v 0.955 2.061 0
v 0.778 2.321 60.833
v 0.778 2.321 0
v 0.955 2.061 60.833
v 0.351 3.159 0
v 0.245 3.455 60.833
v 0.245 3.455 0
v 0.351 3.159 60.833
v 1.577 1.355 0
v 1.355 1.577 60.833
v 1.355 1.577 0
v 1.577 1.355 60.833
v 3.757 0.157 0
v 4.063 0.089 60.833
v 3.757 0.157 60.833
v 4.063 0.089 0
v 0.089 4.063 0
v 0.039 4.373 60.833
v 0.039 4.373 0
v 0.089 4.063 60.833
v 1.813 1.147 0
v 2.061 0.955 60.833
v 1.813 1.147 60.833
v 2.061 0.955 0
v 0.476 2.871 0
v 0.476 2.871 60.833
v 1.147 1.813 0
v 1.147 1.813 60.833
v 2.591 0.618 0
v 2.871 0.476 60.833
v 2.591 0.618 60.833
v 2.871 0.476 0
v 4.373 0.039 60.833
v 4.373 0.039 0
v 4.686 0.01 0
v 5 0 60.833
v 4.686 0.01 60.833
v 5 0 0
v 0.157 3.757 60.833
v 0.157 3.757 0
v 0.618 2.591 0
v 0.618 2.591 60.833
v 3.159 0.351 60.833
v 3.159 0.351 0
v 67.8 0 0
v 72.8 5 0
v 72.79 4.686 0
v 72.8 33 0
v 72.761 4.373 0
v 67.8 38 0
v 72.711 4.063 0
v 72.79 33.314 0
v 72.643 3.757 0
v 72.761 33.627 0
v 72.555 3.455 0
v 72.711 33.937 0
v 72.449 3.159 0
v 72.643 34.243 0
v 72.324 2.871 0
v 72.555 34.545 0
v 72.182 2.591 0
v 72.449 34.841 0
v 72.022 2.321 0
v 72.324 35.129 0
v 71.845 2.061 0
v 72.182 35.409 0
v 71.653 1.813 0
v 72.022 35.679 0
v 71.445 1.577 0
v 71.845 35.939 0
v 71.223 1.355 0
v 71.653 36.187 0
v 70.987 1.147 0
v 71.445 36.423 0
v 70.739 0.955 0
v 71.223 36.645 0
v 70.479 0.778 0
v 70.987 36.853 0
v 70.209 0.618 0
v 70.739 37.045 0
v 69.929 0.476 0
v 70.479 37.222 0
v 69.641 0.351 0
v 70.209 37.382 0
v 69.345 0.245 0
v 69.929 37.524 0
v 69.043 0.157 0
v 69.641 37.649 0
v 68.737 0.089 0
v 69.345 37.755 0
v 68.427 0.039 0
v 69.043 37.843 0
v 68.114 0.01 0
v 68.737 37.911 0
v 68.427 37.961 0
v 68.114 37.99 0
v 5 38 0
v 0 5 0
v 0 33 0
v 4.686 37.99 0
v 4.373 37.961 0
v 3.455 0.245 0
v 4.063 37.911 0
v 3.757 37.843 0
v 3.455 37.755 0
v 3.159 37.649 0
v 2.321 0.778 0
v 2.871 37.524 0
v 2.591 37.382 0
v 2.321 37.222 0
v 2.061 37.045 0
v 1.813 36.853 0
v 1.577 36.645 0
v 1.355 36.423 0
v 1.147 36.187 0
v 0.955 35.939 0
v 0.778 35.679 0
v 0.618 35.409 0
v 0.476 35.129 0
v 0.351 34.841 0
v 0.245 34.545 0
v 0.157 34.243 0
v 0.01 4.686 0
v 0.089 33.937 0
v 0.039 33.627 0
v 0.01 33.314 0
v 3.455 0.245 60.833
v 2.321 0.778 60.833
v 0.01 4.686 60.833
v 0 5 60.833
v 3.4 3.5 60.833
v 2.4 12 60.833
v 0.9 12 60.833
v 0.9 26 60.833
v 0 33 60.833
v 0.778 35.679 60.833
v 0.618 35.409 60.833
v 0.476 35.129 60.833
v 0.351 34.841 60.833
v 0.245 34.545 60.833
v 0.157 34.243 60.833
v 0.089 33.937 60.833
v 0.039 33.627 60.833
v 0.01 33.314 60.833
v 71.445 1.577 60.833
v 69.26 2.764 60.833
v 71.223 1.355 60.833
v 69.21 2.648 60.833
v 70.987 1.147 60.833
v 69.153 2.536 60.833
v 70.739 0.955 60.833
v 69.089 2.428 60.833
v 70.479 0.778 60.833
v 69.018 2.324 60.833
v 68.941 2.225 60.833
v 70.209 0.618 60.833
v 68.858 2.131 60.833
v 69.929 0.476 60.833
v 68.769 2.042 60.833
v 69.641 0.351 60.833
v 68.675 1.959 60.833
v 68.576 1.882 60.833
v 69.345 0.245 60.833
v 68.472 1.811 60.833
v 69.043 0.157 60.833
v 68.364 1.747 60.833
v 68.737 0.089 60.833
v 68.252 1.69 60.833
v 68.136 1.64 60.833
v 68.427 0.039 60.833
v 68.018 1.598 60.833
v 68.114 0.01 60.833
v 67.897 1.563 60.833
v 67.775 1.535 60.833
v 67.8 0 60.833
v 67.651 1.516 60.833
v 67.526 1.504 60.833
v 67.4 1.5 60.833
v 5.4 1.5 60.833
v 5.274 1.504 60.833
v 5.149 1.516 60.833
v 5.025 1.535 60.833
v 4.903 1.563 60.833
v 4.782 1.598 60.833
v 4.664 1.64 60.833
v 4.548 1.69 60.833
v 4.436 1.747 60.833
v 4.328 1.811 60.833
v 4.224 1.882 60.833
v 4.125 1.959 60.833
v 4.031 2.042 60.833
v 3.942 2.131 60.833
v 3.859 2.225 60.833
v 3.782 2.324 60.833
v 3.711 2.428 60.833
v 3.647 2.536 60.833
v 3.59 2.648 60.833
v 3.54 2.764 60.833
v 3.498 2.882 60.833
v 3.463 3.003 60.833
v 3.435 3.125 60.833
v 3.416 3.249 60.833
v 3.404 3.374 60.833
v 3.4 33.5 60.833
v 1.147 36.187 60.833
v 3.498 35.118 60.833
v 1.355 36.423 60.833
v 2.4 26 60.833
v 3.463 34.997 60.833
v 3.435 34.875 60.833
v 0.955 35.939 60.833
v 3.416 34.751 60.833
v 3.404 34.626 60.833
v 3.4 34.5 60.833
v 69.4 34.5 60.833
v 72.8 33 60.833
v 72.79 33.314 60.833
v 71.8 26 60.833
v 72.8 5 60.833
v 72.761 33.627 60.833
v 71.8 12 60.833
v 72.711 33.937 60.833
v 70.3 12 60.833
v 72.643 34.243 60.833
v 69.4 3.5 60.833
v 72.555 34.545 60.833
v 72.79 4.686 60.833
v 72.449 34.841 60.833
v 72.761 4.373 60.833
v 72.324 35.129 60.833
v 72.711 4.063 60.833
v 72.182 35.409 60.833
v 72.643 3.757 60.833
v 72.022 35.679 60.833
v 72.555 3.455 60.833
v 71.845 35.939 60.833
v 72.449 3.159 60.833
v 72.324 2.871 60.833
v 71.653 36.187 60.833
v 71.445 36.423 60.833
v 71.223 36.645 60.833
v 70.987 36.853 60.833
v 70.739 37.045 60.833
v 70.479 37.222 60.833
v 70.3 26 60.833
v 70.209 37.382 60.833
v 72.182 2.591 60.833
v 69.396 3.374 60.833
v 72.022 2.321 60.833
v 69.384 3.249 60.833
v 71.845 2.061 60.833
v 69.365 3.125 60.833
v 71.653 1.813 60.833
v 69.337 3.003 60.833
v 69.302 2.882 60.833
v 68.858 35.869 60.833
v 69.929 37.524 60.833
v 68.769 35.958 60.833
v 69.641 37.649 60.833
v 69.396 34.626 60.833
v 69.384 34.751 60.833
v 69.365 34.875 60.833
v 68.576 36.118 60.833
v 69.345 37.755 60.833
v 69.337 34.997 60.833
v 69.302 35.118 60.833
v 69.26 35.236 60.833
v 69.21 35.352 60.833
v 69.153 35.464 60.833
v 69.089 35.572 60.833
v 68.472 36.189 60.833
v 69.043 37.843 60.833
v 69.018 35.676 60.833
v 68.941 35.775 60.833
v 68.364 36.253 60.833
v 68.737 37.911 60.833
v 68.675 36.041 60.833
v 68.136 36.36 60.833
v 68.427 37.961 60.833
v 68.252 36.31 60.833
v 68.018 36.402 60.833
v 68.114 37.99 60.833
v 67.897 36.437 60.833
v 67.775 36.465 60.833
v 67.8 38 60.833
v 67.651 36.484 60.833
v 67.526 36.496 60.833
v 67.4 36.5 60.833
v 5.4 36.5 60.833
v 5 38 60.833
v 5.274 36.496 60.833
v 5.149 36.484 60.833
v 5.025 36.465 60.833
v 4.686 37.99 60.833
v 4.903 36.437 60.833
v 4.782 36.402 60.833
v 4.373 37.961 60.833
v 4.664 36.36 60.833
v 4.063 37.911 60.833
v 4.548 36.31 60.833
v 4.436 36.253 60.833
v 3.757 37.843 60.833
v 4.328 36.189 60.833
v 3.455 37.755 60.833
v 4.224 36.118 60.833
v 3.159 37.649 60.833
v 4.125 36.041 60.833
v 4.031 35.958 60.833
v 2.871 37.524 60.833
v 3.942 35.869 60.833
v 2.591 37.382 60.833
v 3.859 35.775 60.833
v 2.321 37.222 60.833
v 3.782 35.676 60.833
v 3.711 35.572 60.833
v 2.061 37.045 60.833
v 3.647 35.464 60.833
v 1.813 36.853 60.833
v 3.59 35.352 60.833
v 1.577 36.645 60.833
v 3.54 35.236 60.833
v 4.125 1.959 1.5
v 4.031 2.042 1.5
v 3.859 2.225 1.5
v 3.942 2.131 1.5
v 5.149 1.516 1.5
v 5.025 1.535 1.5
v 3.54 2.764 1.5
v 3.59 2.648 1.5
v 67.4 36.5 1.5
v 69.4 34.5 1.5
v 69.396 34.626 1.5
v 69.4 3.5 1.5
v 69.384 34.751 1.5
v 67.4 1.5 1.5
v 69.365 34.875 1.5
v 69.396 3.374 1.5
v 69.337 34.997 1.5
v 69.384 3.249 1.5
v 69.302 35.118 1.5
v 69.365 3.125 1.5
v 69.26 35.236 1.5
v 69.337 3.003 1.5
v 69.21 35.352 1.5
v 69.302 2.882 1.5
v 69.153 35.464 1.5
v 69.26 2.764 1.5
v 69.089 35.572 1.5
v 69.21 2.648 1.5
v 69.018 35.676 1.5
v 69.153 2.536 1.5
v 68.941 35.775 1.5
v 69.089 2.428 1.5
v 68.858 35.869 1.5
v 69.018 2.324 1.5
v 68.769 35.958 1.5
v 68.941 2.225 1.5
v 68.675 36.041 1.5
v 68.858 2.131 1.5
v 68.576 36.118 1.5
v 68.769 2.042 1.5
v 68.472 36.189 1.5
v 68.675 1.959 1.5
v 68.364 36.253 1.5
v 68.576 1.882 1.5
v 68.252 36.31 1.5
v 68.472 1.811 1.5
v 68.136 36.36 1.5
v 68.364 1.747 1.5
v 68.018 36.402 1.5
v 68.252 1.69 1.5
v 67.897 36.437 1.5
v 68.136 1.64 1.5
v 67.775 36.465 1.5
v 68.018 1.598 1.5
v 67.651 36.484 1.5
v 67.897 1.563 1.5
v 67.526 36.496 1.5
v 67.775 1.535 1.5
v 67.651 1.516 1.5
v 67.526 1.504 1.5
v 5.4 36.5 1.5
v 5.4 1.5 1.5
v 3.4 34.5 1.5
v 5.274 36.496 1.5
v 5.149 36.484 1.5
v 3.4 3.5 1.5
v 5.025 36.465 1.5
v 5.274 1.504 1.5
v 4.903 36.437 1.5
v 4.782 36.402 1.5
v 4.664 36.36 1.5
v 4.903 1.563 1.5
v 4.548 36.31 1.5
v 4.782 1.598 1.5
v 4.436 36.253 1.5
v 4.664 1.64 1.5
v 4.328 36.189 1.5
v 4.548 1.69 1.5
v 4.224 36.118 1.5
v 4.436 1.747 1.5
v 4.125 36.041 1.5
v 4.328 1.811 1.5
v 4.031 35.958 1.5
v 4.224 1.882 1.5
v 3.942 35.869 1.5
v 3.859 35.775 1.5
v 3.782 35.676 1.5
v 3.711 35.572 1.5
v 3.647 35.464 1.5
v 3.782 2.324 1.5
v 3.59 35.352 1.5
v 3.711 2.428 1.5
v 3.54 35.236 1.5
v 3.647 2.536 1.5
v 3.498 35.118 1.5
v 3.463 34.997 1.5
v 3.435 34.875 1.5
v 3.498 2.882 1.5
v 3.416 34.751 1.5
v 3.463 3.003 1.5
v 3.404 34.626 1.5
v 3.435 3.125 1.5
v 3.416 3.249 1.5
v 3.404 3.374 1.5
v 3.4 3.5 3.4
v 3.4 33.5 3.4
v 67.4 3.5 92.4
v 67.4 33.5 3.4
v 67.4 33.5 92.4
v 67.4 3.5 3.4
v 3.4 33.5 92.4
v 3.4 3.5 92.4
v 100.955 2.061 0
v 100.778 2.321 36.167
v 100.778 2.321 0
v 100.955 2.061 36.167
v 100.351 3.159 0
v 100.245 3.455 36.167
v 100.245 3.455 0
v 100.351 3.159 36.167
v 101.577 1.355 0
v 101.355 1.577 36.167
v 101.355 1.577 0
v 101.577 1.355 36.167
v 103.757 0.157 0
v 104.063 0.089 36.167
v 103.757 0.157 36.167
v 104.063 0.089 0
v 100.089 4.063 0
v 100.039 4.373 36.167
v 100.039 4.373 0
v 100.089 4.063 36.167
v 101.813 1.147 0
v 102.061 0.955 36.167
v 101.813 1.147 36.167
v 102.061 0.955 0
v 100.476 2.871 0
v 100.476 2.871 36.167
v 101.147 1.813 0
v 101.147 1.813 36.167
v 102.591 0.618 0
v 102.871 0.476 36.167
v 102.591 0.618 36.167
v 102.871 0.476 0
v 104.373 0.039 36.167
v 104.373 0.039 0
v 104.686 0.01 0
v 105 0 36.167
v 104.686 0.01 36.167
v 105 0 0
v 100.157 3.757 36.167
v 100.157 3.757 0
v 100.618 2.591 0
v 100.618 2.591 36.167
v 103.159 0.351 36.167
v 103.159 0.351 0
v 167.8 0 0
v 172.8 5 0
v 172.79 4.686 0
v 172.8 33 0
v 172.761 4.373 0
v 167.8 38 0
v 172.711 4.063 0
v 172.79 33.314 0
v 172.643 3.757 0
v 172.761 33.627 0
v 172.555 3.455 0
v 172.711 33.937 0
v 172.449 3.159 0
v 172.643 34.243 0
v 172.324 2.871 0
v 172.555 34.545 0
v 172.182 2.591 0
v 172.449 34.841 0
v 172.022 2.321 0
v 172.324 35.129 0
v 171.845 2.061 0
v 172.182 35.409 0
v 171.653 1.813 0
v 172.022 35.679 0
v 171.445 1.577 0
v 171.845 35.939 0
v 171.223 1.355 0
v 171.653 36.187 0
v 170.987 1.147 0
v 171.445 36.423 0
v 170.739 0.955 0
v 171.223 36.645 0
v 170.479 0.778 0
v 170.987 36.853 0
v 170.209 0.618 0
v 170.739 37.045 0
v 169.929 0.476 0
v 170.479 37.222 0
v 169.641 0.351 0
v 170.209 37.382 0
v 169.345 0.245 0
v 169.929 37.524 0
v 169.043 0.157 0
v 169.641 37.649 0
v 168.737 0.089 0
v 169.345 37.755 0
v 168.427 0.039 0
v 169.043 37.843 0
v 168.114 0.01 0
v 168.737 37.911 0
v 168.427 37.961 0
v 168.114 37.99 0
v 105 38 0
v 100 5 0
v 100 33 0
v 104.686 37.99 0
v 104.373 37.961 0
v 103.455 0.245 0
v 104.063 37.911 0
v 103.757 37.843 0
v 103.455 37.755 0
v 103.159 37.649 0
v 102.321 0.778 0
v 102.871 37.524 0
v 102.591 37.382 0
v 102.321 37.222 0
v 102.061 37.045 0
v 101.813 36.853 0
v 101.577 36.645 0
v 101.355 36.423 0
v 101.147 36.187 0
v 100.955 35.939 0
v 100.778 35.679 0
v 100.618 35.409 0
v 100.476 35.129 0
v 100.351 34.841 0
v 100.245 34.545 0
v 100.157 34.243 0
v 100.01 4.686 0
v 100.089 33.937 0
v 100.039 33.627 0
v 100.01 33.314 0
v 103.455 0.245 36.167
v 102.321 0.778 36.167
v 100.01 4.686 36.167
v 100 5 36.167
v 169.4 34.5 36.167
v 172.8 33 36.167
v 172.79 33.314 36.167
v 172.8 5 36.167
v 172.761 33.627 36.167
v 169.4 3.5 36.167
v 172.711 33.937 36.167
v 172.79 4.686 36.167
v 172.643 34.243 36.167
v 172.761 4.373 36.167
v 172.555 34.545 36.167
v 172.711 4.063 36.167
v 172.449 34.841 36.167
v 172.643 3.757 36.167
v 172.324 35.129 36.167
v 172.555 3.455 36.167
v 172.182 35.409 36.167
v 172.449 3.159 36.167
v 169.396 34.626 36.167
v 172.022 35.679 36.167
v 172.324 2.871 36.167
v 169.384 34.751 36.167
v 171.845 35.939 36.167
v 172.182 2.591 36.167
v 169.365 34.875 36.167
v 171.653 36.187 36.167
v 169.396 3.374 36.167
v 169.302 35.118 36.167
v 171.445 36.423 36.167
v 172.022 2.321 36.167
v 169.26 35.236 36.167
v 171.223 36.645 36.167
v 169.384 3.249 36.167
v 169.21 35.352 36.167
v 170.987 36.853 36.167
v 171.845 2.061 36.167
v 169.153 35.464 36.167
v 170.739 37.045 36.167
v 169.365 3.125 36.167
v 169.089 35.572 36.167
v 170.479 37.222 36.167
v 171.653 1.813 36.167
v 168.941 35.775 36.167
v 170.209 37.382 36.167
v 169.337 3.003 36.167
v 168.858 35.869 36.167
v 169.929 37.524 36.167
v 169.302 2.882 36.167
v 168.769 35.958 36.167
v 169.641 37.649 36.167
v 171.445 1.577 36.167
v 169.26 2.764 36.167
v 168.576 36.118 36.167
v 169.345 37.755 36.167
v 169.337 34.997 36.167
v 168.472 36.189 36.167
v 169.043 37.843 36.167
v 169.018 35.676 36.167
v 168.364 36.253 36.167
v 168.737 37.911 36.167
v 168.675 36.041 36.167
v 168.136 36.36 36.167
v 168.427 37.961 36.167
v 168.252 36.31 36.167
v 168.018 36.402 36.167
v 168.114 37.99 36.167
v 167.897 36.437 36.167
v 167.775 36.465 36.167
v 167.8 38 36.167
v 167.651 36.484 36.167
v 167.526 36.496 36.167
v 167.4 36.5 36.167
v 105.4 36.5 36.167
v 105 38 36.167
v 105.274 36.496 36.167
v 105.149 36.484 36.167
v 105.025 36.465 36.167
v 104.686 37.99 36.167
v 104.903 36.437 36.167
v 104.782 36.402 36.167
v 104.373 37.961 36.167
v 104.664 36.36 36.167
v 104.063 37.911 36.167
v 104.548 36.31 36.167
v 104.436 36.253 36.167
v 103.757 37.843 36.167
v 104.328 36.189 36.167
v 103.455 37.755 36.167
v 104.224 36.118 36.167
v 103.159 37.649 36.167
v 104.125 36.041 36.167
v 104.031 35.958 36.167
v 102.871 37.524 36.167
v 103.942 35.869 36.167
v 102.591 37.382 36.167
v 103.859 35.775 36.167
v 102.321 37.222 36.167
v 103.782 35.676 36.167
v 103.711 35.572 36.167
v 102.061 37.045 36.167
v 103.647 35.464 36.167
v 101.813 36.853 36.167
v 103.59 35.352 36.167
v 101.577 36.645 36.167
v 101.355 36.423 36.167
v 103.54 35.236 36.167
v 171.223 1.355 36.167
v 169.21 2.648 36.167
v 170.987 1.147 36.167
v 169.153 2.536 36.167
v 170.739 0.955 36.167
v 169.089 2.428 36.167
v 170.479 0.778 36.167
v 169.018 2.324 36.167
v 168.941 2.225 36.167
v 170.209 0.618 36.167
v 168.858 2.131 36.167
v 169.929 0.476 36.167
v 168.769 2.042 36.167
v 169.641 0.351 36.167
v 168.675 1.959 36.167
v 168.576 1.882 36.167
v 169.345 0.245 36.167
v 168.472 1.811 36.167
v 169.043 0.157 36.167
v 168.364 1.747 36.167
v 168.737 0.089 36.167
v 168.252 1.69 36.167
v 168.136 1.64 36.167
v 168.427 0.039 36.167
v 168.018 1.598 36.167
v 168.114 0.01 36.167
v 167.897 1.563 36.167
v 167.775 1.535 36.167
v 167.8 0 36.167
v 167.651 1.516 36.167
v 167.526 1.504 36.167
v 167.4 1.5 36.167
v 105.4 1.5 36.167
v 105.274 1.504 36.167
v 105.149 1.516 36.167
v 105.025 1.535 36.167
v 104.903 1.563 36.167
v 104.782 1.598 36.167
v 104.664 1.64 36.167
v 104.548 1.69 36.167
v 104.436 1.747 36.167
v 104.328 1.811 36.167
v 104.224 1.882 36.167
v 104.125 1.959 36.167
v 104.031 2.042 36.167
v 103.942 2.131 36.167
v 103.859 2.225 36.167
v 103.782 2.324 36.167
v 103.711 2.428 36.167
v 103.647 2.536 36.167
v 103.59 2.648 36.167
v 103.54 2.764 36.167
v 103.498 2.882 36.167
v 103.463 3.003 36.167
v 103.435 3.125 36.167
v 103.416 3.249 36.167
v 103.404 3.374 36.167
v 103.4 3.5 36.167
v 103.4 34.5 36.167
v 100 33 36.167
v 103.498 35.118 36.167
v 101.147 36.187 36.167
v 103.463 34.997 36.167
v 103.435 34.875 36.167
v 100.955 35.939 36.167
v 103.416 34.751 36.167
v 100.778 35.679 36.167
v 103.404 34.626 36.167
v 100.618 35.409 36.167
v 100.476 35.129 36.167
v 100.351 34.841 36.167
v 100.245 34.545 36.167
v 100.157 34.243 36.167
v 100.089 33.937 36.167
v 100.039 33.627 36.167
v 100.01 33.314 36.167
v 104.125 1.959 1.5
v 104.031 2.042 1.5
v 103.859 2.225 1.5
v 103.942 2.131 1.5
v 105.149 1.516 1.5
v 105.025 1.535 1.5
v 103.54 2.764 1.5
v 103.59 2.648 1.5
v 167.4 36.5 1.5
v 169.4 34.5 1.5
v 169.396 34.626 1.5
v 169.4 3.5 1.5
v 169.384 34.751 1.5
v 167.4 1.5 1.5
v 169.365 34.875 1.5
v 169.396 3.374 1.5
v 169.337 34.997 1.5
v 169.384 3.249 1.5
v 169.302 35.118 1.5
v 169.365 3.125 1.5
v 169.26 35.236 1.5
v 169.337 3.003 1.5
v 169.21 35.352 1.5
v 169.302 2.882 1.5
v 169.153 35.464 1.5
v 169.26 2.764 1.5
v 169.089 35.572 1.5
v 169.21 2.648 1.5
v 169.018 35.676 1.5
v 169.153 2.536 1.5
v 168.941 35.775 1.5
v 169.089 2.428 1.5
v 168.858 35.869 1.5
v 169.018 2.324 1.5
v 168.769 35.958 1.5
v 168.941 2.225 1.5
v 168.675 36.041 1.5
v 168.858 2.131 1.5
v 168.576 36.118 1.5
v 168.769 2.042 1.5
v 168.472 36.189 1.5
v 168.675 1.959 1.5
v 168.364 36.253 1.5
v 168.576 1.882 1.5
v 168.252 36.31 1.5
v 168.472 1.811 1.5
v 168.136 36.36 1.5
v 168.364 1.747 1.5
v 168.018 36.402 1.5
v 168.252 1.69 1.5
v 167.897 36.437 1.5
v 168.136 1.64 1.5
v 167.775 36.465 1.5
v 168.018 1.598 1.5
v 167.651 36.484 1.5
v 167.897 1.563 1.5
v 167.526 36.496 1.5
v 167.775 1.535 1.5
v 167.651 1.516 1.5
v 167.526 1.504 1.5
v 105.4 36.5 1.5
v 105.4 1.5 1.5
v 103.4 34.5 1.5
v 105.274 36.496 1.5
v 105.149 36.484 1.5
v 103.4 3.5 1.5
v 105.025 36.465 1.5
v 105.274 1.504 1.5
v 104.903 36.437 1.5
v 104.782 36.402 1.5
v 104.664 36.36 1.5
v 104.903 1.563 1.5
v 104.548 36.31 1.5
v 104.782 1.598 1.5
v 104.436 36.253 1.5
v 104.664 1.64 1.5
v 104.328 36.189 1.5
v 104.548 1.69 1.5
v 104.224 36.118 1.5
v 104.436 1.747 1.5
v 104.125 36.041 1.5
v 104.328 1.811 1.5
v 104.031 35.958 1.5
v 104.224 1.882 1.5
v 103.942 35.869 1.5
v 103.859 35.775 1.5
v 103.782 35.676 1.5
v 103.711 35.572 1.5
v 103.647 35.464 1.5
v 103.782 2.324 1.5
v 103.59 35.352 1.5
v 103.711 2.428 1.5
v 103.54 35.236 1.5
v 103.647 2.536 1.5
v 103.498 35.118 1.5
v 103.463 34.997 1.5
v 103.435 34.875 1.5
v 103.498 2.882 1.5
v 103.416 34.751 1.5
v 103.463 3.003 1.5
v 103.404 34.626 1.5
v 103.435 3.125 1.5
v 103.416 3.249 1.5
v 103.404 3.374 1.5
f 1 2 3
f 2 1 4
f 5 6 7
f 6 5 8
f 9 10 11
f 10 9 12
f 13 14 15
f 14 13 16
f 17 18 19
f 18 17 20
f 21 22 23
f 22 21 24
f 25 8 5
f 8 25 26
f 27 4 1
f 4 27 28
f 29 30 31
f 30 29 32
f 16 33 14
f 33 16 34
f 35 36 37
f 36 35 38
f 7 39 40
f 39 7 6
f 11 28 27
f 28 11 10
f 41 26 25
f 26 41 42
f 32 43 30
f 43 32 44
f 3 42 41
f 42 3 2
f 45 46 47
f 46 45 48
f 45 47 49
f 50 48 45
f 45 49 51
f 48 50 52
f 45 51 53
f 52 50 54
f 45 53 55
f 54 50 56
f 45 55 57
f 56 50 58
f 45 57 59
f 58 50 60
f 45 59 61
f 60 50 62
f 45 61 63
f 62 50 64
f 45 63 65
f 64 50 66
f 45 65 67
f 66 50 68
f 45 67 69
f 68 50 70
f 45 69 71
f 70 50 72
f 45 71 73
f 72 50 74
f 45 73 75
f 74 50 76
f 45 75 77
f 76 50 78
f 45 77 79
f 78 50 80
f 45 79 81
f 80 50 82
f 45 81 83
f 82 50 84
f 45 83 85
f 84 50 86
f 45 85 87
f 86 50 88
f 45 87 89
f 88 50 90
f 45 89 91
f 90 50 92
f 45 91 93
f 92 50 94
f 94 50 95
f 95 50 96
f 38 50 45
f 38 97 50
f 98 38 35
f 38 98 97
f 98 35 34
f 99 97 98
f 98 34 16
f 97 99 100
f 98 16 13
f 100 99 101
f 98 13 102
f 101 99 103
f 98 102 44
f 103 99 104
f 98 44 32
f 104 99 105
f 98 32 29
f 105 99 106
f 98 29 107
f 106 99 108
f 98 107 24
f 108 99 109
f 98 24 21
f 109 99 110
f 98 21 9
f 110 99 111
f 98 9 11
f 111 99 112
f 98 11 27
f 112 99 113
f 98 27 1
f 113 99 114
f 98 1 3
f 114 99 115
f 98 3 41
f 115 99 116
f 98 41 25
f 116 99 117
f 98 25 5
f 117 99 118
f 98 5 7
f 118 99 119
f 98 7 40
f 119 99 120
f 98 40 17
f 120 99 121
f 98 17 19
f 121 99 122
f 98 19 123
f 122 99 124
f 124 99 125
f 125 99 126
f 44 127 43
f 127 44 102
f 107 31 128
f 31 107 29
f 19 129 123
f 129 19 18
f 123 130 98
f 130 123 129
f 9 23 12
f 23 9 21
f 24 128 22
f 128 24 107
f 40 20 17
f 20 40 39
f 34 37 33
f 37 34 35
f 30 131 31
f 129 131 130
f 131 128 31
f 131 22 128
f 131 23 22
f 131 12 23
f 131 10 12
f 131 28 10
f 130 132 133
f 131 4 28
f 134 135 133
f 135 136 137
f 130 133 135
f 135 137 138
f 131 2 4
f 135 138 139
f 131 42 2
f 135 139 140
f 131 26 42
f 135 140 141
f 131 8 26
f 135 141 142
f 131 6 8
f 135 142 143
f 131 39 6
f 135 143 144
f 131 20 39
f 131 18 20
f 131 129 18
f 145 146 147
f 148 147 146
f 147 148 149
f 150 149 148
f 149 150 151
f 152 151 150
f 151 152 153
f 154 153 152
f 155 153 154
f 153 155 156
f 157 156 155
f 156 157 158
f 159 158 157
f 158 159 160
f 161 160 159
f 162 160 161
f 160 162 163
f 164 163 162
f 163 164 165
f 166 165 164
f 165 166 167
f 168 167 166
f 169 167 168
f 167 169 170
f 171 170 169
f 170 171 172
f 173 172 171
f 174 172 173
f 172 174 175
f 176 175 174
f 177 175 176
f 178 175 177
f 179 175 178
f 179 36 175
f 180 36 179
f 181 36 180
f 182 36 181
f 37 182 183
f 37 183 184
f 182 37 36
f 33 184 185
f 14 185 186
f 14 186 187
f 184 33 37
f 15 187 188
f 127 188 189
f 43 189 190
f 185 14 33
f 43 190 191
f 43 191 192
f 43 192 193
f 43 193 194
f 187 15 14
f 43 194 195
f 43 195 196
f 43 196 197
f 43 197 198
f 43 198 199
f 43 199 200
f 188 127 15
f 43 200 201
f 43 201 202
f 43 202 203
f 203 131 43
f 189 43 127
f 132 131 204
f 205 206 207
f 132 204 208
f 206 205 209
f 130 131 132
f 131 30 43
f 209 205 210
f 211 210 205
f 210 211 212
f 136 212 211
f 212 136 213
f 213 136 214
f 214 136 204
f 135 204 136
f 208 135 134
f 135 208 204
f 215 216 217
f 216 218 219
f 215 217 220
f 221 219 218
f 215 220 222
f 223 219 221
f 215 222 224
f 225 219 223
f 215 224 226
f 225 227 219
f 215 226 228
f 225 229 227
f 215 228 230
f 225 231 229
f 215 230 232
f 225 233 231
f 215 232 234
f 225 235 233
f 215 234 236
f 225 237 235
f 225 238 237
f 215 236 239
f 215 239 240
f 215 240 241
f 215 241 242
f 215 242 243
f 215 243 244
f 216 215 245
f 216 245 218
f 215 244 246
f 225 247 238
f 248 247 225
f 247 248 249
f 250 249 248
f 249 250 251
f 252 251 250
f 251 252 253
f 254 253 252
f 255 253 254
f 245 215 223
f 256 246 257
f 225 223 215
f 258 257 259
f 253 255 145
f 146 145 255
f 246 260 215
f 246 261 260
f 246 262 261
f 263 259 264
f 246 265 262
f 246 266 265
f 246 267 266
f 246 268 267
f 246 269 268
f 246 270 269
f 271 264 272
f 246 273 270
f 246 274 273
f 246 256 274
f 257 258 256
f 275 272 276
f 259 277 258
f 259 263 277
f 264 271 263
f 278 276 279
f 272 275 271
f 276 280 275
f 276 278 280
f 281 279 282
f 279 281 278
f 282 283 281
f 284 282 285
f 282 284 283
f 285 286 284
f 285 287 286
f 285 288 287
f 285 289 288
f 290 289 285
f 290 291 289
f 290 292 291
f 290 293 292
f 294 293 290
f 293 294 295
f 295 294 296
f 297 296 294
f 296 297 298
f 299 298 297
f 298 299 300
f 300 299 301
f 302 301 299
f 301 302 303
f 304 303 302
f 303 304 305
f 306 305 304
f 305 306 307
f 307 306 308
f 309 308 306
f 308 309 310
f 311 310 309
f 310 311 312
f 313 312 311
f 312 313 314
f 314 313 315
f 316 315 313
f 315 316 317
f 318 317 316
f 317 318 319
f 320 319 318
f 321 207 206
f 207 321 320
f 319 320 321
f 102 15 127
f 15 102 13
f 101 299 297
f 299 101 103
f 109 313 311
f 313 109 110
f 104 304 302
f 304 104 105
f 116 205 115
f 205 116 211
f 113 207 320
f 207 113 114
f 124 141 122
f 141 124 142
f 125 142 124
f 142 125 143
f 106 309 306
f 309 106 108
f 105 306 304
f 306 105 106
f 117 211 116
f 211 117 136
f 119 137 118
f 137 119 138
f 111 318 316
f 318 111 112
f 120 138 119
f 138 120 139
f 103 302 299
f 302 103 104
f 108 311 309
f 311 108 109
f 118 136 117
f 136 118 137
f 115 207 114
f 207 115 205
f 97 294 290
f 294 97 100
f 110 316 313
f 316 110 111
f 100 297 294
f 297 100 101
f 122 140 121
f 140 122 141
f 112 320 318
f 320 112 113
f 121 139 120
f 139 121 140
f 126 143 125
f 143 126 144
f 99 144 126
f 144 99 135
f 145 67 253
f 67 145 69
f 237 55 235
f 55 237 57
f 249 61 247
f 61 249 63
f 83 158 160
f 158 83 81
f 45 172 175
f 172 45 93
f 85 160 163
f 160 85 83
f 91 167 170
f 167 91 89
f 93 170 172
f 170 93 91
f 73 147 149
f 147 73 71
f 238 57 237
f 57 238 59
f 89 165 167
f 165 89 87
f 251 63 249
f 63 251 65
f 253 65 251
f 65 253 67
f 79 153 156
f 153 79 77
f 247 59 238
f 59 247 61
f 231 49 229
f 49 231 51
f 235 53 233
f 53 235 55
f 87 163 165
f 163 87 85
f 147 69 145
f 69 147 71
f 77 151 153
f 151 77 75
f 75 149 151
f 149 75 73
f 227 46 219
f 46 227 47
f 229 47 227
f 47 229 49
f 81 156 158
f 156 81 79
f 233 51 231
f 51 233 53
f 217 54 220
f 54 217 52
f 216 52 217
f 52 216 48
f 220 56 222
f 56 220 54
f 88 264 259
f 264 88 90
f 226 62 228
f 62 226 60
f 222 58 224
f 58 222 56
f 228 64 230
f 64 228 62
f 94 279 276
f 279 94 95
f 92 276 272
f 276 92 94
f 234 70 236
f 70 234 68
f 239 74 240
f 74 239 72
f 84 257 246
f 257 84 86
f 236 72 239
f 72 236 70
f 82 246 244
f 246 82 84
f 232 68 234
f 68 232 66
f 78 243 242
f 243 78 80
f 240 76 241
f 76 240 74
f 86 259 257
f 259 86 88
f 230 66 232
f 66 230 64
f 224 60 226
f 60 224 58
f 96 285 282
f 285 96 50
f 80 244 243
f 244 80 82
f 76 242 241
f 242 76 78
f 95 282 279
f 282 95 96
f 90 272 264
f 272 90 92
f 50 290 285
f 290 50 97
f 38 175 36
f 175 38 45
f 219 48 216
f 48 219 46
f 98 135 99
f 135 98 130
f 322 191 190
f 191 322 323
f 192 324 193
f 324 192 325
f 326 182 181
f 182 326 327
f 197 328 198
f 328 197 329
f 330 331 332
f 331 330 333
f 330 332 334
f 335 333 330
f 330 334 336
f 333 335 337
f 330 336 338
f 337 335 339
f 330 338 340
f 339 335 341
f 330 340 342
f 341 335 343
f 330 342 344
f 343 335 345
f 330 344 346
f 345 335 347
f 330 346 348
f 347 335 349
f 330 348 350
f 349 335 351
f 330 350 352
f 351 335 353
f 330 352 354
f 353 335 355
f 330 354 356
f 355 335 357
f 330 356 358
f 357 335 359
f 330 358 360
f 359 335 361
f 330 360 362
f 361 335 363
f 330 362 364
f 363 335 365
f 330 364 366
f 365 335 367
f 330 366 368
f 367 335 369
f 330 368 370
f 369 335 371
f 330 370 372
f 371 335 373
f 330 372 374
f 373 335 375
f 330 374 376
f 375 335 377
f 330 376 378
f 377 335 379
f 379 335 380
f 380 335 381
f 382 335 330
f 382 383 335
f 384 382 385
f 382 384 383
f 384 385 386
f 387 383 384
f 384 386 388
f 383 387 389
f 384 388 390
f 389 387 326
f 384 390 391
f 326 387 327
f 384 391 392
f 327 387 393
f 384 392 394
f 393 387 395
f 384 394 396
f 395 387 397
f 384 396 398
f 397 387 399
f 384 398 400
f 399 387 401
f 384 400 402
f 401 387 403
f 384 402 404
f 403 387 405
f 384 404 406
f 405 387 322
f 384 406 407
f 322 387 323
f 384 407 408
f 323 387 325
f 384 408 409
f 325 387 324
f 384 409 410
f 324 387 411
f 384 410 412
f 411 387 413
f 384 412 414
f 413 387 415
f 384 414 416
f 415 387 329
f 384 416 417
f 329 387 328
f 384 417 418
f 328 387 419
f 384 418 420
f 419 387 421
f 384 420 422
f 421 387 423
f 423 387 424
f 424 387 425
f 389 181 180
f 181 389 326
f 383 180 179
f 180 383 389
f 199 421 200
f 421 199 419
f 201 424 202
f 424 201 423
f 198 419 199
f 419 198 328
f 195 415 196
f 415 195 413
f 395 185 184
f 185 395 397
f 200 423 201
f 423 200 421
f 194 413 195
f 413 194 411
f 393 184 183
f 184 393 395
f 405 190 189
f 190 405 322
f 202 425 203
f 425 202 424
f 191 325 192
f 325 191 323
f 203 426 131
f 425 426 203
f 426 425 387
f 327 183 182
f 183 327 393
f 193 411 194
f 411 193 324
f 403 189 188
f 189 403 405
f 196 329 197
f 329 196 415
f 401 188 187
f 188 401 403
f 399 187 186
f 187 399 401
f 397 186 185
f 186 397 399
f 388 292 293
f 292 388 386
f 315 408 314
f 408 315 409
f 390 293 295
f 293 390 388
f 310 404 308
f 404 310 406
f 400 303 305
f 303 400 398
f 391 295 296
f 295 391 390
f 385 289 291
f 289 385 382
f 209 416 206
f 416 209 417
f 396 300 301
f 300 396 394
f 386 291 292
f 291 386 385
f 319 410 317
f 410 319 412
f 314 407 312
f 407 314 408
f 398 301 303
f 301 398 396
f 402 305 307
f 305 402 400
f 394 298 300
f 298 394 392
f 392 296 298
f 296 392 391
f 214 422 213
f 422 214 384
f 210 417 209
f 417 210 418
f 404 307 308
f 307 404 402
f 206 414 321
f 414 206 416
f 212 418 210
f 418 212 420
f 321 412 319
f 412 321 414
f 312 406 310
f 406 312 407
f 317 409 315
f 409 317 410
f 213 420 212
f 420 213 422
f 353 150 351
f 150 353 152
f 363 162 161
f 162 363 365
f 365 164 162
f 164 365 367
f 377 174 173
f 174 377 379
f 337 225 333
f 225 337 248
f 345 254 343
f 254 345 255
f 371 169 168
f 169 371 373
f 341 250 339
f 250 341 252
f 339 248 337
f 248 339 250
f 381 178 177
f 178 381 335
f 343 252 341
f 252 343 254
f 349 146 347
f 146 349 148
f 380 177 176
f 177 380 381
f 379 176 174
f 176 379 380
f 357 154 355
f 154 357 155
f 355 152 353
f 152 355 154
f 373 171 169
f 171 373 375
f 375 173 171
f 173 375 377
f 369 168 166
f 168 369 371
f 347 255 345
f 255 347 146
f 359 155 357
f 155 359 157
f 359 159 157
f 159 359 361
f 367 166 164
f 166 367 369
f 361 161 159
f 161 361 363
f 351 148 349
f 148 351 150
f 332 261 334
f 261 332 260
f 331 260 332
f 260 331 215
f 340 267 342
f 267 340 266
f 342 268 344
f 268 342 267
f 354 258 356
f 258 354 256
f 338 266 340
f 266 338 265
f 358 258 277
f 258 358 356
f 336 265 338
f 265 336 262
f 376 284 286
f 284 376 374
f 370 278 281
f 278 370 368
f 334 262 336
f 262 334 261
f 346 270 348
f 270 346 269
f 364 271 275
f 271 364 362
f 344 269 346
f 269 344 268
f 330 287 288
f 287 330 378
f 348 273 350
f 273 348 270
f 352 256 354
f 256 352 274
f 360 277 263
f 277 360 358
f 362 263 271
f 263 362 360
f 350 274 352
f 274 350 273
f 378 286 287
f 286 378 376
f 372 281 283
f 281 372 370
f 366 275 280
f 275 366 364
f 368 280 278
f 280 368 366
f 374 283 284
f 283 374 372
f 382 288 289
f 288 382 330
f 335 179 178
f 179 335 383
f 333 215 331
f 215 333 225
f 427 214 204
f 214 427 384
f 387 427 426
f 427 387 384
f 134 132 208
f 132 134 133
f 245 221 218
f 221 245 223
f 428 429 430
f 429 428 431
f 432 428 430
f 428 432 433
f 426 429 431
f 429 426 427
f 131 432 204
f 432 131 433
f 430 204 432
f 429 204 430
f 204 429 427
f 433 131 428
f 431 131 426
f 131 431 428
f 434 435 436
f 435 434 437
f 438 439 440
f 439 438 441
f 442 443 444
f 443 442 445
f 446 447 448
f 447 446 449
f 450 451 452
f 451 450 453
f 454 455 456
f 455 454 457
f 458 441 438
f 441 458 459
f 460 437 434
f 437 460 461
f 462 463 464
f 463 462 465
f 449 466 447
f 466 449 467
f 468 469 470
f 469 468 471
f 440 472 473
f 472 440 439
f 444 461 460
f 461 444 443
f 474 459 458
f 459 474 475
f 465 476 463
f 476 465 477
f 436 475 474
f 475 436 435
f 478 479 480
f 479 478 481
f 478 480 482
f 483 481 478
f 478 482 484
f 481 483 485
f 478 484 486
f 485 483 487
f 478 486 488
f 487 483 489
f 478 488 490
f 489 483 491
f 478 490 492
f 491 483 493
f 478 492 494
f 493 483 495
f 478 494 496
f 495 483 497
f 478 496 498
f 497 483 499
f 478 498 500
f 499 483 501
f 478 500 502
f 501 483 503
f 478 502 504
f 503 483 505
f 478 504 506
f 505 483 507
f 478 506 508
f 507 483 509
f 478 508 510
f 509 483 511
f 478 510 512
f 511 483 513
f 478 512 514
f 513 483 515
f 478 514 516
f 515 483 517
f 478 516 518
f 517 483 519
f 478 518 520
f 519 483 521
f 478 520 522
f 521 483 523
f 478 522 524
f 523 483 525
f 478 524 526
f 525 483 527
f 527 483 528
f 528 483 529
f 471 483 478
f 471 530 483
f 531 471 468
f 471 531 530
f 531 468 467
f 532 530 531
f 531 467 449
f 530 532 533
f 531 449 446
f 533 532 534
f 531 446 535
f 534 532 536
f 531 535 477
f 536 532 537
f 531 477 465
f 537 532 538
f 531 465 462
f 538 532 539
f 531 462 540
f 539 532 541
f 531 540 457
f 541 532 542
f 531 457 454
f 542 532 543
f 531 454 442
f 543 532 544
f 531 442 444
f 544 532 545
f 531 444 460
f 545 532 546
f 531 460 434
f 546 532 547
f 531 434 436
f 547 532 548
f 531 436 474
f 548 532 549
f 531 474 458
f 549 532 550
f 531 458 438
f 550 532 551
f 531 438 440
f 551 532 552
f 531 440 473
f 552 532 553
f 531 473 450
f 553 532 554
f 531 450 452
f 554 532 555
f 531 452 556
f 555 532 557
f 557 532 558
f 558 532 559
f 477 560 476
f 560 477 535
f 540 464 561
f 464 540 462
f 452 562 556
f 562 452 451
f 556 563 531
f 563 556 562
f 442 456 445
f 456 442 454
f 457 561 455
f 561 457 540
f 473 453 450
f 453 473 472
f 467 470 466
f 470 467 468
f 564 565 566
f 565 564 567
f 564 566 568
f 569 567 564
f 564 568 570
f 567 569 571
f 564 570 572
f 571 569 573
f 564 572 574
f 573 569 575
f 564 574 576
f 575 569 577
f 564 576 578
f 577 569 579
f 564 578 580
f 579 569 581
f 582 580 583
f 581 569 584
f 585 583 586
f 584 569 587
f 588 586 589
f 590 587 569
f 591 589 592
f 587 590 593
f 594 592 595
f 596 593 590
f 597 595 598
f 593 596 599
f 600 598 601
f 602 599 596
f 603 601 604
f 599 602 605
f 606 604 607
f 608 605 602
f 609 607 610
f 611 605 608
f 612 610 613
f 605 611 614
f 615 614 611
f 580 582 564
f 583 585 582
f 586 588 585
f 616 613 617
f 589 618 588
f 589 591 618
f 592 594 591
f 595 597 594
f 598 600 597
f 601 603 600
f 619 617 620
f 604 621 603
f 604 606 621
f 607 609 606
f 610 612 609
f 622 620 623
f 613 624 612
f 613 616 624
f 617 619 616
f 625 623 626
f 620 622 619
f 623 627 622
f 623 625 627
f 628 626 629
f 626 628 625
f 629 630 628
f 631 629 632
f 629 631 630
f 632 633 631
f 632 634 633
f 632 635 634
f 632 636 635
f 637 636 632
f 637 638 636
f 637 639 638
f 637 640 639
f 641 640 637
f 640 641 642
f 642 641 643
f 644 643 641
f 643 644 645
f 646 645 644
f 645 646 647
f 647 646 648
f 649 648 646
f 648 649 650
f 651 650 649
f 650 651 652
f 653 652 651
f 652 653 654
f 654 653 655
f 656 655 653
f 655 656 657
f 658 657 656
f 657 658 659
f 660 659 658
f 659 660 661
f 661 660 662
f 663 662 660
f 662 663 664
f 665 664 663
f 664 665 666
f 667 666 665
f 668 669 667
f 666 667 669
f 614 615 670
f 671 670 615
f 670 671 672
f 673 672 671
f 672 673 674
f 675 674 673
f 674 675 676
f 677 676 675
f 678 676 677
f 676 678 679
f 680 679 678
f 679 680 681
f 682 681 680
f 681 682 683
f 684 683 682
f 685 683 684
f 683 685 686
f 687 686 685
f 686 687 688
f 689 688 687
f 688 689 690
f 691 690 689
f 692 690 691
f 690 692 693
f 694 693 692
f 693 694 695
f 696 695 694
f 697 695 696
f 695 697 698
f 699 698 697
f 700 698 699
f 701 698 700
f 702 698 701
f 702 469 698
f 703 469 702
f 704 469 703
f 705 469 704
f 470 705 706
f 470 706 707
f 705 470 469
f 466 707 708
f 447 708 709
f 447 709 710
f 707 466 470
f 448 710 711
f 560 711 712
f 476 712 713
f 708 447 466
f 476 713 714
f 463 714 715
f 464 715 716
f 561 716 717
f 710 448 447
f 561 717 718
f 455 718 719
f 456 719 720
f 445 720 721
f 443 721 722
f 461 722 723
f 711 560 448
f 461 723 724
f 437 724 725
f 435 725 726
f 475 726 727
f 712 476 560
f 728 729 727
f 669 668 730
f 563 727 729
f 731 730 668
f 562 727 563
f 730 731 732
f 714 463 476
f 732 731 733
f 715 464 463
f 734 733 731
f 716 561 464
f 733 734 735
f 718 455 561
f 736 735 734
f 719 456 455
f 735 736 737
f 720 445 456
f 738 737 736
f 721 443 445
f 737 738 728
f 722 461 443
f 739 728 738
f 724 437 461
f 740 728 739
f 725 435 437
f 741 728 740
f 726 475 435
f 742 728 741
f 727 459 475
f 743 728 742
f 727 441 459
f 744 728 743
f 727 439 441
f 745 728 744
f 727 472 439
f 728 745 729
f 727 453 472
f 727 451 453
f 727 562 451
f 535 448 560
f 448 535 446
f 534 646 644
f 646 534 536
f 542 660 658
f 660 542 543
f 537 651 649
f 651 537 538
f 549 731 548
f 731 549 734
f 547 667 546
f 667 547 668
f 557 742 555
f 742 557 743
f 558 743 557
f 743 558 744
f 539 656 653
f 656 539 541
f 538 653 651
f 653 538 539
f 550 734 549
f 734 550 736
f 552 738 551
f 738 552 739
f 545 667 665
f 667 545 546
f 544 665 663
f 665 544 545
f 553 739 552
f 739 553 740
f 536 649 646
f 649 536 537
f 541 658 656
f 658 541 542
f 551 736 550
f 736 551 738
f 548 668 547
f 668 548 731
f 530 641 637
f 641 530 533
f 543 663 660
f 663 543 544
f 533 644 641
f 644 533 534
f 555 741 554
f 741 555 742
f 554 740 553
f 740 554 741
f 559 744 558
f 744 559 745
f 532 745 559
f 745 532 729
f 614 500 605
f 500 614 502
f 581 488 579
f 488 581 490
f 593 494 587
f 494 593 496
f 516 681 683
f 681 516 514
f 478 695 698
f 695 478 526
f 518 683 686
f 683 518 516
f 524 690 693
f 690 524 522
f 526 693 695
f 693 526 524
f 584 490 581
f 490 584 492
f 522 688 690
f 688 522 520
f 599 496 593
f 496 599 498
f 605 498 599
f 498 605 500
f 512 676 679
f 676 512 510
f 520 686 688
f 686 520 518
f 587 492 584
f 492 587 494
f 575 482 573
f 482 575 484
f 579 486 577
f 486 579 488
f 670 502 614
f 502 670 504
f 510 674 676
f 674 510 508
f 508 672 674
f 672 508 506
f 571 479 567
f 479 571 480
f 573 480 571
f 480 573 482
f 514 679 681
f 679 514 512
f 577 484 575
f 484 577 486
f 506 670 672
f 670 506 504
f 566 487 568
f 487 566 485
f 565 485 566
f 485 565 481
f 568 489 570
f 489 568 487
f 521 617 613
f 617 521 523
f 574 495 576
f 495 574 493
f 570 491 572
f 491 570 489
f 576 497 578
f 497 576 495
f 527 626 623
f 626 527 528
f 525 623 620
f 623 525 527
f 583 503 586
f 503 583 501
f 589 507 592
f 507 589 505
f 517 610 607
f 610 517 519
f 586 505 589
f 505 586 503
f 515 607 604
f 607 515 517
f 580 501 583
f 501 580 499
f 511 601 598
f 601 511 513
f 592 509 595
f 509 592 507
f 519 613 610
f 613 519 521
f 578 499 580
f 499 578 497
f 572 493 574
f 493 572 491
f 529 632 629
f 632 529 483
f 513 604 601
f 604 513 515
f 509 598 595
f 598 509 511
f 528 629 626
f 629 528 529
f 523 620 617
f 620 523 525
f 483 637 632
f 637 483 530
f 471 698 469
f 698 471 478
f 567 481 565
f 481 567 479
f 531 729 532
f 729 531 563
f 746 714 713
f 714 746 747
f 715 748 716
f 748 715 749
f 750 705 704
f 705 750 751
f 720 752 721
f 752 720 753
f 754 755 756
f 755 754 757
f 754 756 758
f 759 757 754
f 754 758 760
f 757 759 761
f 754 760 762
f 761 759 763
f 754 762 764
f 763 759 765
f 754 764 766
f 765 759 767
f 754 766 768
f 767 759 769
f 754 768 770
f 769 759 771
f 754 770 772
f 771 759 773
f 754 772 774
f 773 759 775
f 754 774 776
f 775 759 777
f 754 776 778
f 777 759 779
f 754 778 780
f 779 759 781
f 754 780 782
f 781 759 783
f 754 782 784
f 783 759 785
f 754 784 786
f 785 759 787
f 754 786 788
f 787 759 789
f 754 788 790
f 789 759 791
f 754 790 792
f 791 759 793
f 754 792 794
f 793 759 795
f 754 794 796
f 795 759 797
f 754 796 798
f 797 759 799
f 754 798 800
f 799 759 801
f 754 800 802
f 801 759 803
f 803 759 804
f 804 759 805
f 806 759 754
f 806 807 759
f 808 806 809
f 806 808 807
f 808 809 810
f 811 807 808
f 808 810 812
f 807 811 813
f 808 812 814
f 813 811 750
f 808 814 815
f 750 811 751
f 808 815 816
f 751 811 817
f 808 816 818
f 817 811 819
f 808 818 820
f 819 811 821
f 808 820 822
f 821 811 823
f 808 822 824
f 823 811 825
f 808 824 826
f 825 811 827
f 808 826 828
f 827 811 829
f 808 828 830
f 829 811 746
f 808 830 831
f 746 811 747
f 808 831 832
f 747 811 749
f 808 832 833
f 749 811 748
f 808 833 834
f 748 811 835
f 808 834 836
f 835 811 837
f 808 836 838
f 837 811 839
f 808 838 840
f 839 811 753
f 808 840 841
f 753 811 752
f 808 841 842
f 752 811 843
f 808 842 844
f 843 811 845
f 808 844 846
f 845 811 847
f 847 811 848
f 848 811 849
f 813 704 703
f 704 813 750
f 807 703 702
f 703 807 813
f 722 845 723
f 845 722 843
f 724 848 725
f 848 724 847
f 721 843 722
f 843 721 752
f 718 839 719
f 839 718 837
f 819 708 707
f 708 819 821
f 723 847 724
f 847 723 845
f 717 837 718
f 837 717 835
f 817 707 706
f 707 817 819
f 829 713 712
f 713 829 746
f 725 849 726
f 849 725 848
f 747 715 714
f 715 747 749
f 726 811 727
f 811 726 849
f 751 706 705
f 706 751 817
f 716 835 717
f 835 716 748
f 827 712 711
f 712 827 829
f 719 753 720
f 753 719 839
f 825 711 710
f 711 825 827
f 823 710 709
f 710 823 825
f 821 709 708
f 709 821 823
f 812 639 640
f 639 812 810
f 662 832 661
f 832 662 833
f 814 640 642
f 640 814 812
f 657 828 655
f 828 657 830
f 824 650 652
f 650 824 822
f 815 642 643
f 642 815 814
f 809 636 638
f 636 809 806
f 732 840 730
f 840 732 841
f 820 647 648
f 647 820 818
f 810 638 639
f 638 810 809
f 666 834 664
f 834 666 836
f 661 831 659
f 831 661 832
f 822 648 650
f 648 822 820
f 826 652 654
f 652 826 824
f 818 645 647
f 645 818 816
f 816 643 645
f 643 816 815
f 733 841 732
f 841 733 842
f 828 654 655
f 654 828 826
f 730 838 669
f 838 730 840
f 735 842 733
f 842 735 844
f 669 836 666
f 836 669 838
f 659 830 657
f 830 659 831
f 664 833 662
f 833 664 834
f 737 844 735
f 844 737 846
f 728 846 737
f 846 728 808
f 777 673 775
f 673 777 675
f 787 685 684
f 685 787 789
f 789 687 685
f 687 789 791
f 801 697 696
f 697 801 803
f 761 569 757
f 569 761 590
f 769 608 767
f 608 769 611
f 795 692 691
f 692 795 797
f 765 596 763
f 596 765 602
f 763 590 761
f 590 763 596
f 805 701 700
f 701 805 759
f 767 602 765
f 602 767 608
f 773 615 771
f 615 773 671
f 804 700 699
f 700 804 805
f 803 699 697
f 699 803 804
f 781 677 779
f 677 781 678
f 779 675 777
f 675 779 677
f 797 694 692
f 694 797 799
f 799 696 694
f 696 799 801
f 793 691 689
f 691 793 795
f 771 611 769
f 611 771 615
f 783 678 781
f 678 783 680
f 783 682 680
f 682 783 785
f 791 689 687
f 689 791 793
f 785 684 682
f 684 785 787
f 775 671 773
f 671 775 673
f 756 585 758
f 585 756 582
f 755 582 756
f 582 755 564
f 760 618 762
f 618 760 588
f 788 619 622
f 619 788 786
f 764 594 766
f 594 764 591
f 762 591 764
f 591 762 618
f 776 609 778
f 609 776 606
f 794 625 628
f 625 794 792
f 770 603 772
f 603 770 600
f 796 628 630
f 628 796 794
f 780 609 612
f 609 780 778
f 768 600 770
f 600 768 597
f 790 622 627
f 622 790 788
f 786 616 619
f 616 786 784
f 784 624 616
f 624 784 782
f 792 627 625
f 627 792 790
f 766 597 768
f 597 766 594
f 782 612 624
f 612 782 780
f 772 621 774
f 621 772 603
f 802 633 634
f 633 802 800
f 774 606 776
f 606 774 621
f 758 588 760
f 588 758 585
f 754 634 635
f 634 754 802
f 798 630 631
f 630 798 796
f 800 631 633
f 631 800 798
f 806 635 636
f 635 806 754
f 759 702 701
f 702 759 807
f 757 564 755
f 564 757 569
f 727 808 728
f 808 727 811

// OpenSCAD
// file: clips.scad
/*
Provides 2 functions:
    clip(height): An actual clip, height is the height to print with the click laid flat
    socket(height): The cutout to generate for the clip. It's suggented to make the height slightly more to ease access
*/
CLIP_STOPPER = 2;
CLIP_SOCKET_W = 7*2;
CLIP_SOCKET_D = 10.6;

module sampleclipsocket() {
    translate([0, 0, 0]) {
        union() {
            clip(1);
            //translate([-6, -10, 0]) cube([12, 10, 1]);
            mirror([0, 1, 0]) clip(1);
        }
    }
    //%cliphollow(2);

    rotate([-90, 0, 0]) {
    translate([20, -13, 0]) {
        difference() {
            translate([-10, 0, 0]) cube([20, 13, 3]);
            translate([0, 0, 1.4/2]) socket(1.6);
        }
    }
}
}

//sampleclipsocket();

clipmainpoints = [
    [4.9, 5.695],
    [5.197, 5.905],
        // Edges of outer corner
        [5.253, 5.991],
        [5.297, 6.103],
        [5.324, 6.233],
        [5.331, 6.37],
    [5.318, 6.50],
    [4.868, 7.284],
    [2.55, 9.60],
    ];

clipstopperpoints = [
    [0,0],
    [6.6, 0],
    [6.6, CLIP_STOPPER],
    [4.9, CLIP_STOPPER],
];

cliphollowpoints = concat(clipmainpoints, [[0,  9.60], [0, 1.5], [4.9, 1.5]]);

//for(x=clipmainpoints) translate(x) color("aqua") cylinder(h=2, d=0.1);
//for(x=clipstopperpoints) translate(x) color("red") cylinder(h=2, d=0.1);
//for(x=clipmainpoints) translate(x) color("aqua") cylinder(h=2, d=0.1);
    
// The area to hollow out around a clip so the arms can bend
// Area should be hollowed, before clip is then built in place
module cliphollow(h) {
    linear_extrude(h) polygon(cliphollowpoints);
    linear_extrude(h) mirror([1, 0 ,0]) polygon(cliphollowpoints);
}

module socket(h) {
    linear_extrude(h) socketpolygon();
}

module socketpolygon() {
    socketedge();
    mirror([1, 0 ,0]) socketedge();
    
    module socketedge() {
        polygon([
            [0, 0], 
            [7, 0],
            [7, 2],
            [6, 2],
            [5, 5],
            [5, 6],
            [7, 6],
            [7, 10.6],
            [0, 10.6],
            ]);
    }
}

module clip(h, scale_width=1) {
    scale([scale_width, 1, 1]) linear_extrude(h) clippolygon();
}



module clippolygon() {
    //W = 13.2;
    D = 3.7;
   // H = 3.5;
    H = 1.5;
    
    clipedge();
    mirror([1, 0, 0]) clipedge();

    module clipedge() {
        resolution = 20;




        curve = [
            [1, 9.60],
            [2.1, 5.85],
            [2.7, 1.55],
            [0, 1.578],
            ];
        curvepoints = bezier(curve);

        fullpoints = concat(curvepoints, clipstopperpoints, clipmainpoints);
        polygon(fullpoints);


        function choose(n, k)=
             k == 0 ? 1 : (n * choose(n - 1, k - 1)) / k;

        function _point_on_bezier_rec(points,t,i,c)=
            len(points) == i ? c
            : _point_on_bezier_rec(points,t,i+1,c+choose(len(points)-1,i) * pow(t,i) * pow(1-t,len(points)-i-1) * points[i]);

        function _point_on_bezier(points,t)=
            _point_on_bezier_rec(points,t,0,[0,0]);

        //a bezier curve with any number of control points
        //parameters: 
        //points - the control points of the bezier curve (number of points is variable)
        //returns:
        //resolution number of samples on the bezier curve
        function bezier(points)=[
            for (t =[0:1.0/resolution:1+1.0/(resolution/2)]) _point_on_bezier(points,t)
        ];

    }
}
// file: consts.scad
$fn=100;

FLOOR = 1;
WALL = 1;
BASE_H= 3;

CLIP_H = 1.4;

BOX_H = 115;
BOX_W = 305;
BOX_D = 305;

// Upper tray for large minis
UPPER_MINI_MAX_H = 74;
UPPER_TRAY_H = FLOOR + UPPER_MINI_MAX_H; // 75mm
UPPER_TRAY_W = 140;
UPPER_TRAY_D = 131;

// Lower tray for small minis
LOWER_MINI_MAX_H = 47;
LOWER_TRAY_W = 200;
LOWER_TRAY_D = 200;
LOWER_TRAY_H  = FLOOR + LOWER_MINI_MAX_H; // 48mm
LOWER_TRAY_UPPER_H = BOX_H - UPPER_TRAY_H; // 40mm

// Terrain tiles
LARGE_TERRAIN_TILE_W = 217;
LARGE_TERRAIN_TILE_D = 115;
LARGE_TERRAIN_TILE_H = 9; // stack

SMALL_TERRAIN_TILE_W = 115;
SMALL_TERRAIN_TILE_D = 115;
SMALL_TERRAIN_TILE_H = 68;

TERRAIN_FLOOR = 1;
TERRAIN_SUPPORT = 3;
TERRAIN_WALL = 3;
TERRAIN_PEG_EDGE = 20;

SMALL_TERRAIN_TILES = 32;
LARGE_TERRAIN_TILES = 4;

SMALL_TERRAIN_BASE_W = SMALL_TERRAIN_TILE_W*2;
SMALL_TERRAIN_BASE_D = SMALL_TERRAIN_TILE_D;
SMALL_TERRAIN_BASE_H = SMALL_TERRAIN_TILE_H/2 + TERRAIN_SUPPORT + 9;

LARGE_TERRAIN_BASE_W = LARGE_TERRAIN_TILE_W;
LARGE_TERRAIN_BASE_D = LARGE_TERRAIN_TILE_D;
LARGE_TERRAIN_BASE_H = LARGE_TERRAIN_TILE_H + TERRAIN_SUPPORT + 9;

TERRAIN_V_WALL = 2;
TERRAIN_TAB_W = 6;
TERRAIN_TAB_D = 16;
TERRAIN_V_SUPPORT_W = TERRAIN_TAB_W + 25;

SMALL_TERRAIN_BOX_W = SMALL_TERRAIN_TILE_W + TERRAIN_V_WALL*2 + 4;
SMALL_TERRAIN_BOX_D = SMALL_TERRAIN_TILE_H + TERRAIN_V_WALL*2 + 5;
SMALL_TERRAIN_BOX_H = SMALL_TERRAIN_TILE_D/2 + TERRAIN_V_WALL + TERRAIN_TAB_D;

LARGE_TERRAIN_BOX_W = LARGE_TERRAIN_TILE_W + TERRAIN_V_WALL*2 + 4;
LARGE_TERRAIN_BOX_D = LARGE_TERRAIN_TILE_H + TERRAIN_V_WALL*2 + 5;
LARGE_TERRAIN_BOX_H = LARGE_TERRAIN_TILE_D/2 + TERRAIN_V_WALL + TERRAIN_TAB_D;

// Cards
CARD_W = 64;
CARD_D = 89;
CARD_STACK = 30;

CARD_WALL = 1.5;
CARD_EDGE_WALL = CLIP_H + 2;

CARD_BOX_W = CARD_W + CARD_EDGE_WALL*2 + 2;
CARD_BOX_D = CARD_STACK + CARD_WALL*2 + 5;
CARD_BOX_H = CARD_D / 3 * 2 + CARD_WALL;

CARD_BOX_LID_H = CARD_D / 3 + CARD_WALL + 5;




// A small file to allow clips to made to provide a cover where required
include <clips.scad>

use <MCAD/boxes.scad>

module roundedCube(size, radius, sidesonly) {
    translate([size[0]/2, size[1]/2, size[2]/2]) roundedBox(size, radius, sidesonly);
}
// main file
include <consts.scad>;


module card_box(withlid=false) {
    card_box_obj(CARD_BOX_H);
    #translate([CARD_EDGE_WALL, CARD_WALL+2, CARD_EDGE_WALL]) cards_stack();
    if (withlid) {
        %translate([CARD_BOX_W, 0, CARD_BOX_H+CARD_BOX_LID_H]) rotate([0, 180, 0]) card_box_lid();
    }
}

module card_box_lid() {
    card_box_obj(CARD_BOX_LID_H);
}

module card_box_obj(H) {
    difference() {
        union() {
            translate([0, 0, 0]) roundedCube([CARD_BOX_W, CARD_BOX_D, H], 5, true);
        }
        translate([CARD_EDGE_WALL, CARD_WALL, CARD_WALL]) roundedCube([CARD_BOX_W-CARD_EDGE_WALL*2, CARD_BOX_D-CARD_WALL*2, H], 2, true);
    }
    //#translate([TERRAIN_V_WALL, 2*SMALL_TERRAIN_TILES+TERRAIN_V_WALL, 0]) rotate([90, 0, 0]) small_terrain_tile(SMALL_TERRAIN_TILES);
    for (x=[0,1]) {
        offset = x * (CARD_BOX_W - CARD_EDGE_WALL);
        #translate([CLIP_H+(CARD_EDGE_WALL-CLIP_H)/2+offset,CARD_BOX_D/2,H]) rotate([-90, 0, 90]) socket(1.5);
    }
}

module cards_stack() {
    cube([CARD_W, CARD_STACK, CARD_D]);
}

card_box();
translate([100, 0, 0]) card_box_lid();
